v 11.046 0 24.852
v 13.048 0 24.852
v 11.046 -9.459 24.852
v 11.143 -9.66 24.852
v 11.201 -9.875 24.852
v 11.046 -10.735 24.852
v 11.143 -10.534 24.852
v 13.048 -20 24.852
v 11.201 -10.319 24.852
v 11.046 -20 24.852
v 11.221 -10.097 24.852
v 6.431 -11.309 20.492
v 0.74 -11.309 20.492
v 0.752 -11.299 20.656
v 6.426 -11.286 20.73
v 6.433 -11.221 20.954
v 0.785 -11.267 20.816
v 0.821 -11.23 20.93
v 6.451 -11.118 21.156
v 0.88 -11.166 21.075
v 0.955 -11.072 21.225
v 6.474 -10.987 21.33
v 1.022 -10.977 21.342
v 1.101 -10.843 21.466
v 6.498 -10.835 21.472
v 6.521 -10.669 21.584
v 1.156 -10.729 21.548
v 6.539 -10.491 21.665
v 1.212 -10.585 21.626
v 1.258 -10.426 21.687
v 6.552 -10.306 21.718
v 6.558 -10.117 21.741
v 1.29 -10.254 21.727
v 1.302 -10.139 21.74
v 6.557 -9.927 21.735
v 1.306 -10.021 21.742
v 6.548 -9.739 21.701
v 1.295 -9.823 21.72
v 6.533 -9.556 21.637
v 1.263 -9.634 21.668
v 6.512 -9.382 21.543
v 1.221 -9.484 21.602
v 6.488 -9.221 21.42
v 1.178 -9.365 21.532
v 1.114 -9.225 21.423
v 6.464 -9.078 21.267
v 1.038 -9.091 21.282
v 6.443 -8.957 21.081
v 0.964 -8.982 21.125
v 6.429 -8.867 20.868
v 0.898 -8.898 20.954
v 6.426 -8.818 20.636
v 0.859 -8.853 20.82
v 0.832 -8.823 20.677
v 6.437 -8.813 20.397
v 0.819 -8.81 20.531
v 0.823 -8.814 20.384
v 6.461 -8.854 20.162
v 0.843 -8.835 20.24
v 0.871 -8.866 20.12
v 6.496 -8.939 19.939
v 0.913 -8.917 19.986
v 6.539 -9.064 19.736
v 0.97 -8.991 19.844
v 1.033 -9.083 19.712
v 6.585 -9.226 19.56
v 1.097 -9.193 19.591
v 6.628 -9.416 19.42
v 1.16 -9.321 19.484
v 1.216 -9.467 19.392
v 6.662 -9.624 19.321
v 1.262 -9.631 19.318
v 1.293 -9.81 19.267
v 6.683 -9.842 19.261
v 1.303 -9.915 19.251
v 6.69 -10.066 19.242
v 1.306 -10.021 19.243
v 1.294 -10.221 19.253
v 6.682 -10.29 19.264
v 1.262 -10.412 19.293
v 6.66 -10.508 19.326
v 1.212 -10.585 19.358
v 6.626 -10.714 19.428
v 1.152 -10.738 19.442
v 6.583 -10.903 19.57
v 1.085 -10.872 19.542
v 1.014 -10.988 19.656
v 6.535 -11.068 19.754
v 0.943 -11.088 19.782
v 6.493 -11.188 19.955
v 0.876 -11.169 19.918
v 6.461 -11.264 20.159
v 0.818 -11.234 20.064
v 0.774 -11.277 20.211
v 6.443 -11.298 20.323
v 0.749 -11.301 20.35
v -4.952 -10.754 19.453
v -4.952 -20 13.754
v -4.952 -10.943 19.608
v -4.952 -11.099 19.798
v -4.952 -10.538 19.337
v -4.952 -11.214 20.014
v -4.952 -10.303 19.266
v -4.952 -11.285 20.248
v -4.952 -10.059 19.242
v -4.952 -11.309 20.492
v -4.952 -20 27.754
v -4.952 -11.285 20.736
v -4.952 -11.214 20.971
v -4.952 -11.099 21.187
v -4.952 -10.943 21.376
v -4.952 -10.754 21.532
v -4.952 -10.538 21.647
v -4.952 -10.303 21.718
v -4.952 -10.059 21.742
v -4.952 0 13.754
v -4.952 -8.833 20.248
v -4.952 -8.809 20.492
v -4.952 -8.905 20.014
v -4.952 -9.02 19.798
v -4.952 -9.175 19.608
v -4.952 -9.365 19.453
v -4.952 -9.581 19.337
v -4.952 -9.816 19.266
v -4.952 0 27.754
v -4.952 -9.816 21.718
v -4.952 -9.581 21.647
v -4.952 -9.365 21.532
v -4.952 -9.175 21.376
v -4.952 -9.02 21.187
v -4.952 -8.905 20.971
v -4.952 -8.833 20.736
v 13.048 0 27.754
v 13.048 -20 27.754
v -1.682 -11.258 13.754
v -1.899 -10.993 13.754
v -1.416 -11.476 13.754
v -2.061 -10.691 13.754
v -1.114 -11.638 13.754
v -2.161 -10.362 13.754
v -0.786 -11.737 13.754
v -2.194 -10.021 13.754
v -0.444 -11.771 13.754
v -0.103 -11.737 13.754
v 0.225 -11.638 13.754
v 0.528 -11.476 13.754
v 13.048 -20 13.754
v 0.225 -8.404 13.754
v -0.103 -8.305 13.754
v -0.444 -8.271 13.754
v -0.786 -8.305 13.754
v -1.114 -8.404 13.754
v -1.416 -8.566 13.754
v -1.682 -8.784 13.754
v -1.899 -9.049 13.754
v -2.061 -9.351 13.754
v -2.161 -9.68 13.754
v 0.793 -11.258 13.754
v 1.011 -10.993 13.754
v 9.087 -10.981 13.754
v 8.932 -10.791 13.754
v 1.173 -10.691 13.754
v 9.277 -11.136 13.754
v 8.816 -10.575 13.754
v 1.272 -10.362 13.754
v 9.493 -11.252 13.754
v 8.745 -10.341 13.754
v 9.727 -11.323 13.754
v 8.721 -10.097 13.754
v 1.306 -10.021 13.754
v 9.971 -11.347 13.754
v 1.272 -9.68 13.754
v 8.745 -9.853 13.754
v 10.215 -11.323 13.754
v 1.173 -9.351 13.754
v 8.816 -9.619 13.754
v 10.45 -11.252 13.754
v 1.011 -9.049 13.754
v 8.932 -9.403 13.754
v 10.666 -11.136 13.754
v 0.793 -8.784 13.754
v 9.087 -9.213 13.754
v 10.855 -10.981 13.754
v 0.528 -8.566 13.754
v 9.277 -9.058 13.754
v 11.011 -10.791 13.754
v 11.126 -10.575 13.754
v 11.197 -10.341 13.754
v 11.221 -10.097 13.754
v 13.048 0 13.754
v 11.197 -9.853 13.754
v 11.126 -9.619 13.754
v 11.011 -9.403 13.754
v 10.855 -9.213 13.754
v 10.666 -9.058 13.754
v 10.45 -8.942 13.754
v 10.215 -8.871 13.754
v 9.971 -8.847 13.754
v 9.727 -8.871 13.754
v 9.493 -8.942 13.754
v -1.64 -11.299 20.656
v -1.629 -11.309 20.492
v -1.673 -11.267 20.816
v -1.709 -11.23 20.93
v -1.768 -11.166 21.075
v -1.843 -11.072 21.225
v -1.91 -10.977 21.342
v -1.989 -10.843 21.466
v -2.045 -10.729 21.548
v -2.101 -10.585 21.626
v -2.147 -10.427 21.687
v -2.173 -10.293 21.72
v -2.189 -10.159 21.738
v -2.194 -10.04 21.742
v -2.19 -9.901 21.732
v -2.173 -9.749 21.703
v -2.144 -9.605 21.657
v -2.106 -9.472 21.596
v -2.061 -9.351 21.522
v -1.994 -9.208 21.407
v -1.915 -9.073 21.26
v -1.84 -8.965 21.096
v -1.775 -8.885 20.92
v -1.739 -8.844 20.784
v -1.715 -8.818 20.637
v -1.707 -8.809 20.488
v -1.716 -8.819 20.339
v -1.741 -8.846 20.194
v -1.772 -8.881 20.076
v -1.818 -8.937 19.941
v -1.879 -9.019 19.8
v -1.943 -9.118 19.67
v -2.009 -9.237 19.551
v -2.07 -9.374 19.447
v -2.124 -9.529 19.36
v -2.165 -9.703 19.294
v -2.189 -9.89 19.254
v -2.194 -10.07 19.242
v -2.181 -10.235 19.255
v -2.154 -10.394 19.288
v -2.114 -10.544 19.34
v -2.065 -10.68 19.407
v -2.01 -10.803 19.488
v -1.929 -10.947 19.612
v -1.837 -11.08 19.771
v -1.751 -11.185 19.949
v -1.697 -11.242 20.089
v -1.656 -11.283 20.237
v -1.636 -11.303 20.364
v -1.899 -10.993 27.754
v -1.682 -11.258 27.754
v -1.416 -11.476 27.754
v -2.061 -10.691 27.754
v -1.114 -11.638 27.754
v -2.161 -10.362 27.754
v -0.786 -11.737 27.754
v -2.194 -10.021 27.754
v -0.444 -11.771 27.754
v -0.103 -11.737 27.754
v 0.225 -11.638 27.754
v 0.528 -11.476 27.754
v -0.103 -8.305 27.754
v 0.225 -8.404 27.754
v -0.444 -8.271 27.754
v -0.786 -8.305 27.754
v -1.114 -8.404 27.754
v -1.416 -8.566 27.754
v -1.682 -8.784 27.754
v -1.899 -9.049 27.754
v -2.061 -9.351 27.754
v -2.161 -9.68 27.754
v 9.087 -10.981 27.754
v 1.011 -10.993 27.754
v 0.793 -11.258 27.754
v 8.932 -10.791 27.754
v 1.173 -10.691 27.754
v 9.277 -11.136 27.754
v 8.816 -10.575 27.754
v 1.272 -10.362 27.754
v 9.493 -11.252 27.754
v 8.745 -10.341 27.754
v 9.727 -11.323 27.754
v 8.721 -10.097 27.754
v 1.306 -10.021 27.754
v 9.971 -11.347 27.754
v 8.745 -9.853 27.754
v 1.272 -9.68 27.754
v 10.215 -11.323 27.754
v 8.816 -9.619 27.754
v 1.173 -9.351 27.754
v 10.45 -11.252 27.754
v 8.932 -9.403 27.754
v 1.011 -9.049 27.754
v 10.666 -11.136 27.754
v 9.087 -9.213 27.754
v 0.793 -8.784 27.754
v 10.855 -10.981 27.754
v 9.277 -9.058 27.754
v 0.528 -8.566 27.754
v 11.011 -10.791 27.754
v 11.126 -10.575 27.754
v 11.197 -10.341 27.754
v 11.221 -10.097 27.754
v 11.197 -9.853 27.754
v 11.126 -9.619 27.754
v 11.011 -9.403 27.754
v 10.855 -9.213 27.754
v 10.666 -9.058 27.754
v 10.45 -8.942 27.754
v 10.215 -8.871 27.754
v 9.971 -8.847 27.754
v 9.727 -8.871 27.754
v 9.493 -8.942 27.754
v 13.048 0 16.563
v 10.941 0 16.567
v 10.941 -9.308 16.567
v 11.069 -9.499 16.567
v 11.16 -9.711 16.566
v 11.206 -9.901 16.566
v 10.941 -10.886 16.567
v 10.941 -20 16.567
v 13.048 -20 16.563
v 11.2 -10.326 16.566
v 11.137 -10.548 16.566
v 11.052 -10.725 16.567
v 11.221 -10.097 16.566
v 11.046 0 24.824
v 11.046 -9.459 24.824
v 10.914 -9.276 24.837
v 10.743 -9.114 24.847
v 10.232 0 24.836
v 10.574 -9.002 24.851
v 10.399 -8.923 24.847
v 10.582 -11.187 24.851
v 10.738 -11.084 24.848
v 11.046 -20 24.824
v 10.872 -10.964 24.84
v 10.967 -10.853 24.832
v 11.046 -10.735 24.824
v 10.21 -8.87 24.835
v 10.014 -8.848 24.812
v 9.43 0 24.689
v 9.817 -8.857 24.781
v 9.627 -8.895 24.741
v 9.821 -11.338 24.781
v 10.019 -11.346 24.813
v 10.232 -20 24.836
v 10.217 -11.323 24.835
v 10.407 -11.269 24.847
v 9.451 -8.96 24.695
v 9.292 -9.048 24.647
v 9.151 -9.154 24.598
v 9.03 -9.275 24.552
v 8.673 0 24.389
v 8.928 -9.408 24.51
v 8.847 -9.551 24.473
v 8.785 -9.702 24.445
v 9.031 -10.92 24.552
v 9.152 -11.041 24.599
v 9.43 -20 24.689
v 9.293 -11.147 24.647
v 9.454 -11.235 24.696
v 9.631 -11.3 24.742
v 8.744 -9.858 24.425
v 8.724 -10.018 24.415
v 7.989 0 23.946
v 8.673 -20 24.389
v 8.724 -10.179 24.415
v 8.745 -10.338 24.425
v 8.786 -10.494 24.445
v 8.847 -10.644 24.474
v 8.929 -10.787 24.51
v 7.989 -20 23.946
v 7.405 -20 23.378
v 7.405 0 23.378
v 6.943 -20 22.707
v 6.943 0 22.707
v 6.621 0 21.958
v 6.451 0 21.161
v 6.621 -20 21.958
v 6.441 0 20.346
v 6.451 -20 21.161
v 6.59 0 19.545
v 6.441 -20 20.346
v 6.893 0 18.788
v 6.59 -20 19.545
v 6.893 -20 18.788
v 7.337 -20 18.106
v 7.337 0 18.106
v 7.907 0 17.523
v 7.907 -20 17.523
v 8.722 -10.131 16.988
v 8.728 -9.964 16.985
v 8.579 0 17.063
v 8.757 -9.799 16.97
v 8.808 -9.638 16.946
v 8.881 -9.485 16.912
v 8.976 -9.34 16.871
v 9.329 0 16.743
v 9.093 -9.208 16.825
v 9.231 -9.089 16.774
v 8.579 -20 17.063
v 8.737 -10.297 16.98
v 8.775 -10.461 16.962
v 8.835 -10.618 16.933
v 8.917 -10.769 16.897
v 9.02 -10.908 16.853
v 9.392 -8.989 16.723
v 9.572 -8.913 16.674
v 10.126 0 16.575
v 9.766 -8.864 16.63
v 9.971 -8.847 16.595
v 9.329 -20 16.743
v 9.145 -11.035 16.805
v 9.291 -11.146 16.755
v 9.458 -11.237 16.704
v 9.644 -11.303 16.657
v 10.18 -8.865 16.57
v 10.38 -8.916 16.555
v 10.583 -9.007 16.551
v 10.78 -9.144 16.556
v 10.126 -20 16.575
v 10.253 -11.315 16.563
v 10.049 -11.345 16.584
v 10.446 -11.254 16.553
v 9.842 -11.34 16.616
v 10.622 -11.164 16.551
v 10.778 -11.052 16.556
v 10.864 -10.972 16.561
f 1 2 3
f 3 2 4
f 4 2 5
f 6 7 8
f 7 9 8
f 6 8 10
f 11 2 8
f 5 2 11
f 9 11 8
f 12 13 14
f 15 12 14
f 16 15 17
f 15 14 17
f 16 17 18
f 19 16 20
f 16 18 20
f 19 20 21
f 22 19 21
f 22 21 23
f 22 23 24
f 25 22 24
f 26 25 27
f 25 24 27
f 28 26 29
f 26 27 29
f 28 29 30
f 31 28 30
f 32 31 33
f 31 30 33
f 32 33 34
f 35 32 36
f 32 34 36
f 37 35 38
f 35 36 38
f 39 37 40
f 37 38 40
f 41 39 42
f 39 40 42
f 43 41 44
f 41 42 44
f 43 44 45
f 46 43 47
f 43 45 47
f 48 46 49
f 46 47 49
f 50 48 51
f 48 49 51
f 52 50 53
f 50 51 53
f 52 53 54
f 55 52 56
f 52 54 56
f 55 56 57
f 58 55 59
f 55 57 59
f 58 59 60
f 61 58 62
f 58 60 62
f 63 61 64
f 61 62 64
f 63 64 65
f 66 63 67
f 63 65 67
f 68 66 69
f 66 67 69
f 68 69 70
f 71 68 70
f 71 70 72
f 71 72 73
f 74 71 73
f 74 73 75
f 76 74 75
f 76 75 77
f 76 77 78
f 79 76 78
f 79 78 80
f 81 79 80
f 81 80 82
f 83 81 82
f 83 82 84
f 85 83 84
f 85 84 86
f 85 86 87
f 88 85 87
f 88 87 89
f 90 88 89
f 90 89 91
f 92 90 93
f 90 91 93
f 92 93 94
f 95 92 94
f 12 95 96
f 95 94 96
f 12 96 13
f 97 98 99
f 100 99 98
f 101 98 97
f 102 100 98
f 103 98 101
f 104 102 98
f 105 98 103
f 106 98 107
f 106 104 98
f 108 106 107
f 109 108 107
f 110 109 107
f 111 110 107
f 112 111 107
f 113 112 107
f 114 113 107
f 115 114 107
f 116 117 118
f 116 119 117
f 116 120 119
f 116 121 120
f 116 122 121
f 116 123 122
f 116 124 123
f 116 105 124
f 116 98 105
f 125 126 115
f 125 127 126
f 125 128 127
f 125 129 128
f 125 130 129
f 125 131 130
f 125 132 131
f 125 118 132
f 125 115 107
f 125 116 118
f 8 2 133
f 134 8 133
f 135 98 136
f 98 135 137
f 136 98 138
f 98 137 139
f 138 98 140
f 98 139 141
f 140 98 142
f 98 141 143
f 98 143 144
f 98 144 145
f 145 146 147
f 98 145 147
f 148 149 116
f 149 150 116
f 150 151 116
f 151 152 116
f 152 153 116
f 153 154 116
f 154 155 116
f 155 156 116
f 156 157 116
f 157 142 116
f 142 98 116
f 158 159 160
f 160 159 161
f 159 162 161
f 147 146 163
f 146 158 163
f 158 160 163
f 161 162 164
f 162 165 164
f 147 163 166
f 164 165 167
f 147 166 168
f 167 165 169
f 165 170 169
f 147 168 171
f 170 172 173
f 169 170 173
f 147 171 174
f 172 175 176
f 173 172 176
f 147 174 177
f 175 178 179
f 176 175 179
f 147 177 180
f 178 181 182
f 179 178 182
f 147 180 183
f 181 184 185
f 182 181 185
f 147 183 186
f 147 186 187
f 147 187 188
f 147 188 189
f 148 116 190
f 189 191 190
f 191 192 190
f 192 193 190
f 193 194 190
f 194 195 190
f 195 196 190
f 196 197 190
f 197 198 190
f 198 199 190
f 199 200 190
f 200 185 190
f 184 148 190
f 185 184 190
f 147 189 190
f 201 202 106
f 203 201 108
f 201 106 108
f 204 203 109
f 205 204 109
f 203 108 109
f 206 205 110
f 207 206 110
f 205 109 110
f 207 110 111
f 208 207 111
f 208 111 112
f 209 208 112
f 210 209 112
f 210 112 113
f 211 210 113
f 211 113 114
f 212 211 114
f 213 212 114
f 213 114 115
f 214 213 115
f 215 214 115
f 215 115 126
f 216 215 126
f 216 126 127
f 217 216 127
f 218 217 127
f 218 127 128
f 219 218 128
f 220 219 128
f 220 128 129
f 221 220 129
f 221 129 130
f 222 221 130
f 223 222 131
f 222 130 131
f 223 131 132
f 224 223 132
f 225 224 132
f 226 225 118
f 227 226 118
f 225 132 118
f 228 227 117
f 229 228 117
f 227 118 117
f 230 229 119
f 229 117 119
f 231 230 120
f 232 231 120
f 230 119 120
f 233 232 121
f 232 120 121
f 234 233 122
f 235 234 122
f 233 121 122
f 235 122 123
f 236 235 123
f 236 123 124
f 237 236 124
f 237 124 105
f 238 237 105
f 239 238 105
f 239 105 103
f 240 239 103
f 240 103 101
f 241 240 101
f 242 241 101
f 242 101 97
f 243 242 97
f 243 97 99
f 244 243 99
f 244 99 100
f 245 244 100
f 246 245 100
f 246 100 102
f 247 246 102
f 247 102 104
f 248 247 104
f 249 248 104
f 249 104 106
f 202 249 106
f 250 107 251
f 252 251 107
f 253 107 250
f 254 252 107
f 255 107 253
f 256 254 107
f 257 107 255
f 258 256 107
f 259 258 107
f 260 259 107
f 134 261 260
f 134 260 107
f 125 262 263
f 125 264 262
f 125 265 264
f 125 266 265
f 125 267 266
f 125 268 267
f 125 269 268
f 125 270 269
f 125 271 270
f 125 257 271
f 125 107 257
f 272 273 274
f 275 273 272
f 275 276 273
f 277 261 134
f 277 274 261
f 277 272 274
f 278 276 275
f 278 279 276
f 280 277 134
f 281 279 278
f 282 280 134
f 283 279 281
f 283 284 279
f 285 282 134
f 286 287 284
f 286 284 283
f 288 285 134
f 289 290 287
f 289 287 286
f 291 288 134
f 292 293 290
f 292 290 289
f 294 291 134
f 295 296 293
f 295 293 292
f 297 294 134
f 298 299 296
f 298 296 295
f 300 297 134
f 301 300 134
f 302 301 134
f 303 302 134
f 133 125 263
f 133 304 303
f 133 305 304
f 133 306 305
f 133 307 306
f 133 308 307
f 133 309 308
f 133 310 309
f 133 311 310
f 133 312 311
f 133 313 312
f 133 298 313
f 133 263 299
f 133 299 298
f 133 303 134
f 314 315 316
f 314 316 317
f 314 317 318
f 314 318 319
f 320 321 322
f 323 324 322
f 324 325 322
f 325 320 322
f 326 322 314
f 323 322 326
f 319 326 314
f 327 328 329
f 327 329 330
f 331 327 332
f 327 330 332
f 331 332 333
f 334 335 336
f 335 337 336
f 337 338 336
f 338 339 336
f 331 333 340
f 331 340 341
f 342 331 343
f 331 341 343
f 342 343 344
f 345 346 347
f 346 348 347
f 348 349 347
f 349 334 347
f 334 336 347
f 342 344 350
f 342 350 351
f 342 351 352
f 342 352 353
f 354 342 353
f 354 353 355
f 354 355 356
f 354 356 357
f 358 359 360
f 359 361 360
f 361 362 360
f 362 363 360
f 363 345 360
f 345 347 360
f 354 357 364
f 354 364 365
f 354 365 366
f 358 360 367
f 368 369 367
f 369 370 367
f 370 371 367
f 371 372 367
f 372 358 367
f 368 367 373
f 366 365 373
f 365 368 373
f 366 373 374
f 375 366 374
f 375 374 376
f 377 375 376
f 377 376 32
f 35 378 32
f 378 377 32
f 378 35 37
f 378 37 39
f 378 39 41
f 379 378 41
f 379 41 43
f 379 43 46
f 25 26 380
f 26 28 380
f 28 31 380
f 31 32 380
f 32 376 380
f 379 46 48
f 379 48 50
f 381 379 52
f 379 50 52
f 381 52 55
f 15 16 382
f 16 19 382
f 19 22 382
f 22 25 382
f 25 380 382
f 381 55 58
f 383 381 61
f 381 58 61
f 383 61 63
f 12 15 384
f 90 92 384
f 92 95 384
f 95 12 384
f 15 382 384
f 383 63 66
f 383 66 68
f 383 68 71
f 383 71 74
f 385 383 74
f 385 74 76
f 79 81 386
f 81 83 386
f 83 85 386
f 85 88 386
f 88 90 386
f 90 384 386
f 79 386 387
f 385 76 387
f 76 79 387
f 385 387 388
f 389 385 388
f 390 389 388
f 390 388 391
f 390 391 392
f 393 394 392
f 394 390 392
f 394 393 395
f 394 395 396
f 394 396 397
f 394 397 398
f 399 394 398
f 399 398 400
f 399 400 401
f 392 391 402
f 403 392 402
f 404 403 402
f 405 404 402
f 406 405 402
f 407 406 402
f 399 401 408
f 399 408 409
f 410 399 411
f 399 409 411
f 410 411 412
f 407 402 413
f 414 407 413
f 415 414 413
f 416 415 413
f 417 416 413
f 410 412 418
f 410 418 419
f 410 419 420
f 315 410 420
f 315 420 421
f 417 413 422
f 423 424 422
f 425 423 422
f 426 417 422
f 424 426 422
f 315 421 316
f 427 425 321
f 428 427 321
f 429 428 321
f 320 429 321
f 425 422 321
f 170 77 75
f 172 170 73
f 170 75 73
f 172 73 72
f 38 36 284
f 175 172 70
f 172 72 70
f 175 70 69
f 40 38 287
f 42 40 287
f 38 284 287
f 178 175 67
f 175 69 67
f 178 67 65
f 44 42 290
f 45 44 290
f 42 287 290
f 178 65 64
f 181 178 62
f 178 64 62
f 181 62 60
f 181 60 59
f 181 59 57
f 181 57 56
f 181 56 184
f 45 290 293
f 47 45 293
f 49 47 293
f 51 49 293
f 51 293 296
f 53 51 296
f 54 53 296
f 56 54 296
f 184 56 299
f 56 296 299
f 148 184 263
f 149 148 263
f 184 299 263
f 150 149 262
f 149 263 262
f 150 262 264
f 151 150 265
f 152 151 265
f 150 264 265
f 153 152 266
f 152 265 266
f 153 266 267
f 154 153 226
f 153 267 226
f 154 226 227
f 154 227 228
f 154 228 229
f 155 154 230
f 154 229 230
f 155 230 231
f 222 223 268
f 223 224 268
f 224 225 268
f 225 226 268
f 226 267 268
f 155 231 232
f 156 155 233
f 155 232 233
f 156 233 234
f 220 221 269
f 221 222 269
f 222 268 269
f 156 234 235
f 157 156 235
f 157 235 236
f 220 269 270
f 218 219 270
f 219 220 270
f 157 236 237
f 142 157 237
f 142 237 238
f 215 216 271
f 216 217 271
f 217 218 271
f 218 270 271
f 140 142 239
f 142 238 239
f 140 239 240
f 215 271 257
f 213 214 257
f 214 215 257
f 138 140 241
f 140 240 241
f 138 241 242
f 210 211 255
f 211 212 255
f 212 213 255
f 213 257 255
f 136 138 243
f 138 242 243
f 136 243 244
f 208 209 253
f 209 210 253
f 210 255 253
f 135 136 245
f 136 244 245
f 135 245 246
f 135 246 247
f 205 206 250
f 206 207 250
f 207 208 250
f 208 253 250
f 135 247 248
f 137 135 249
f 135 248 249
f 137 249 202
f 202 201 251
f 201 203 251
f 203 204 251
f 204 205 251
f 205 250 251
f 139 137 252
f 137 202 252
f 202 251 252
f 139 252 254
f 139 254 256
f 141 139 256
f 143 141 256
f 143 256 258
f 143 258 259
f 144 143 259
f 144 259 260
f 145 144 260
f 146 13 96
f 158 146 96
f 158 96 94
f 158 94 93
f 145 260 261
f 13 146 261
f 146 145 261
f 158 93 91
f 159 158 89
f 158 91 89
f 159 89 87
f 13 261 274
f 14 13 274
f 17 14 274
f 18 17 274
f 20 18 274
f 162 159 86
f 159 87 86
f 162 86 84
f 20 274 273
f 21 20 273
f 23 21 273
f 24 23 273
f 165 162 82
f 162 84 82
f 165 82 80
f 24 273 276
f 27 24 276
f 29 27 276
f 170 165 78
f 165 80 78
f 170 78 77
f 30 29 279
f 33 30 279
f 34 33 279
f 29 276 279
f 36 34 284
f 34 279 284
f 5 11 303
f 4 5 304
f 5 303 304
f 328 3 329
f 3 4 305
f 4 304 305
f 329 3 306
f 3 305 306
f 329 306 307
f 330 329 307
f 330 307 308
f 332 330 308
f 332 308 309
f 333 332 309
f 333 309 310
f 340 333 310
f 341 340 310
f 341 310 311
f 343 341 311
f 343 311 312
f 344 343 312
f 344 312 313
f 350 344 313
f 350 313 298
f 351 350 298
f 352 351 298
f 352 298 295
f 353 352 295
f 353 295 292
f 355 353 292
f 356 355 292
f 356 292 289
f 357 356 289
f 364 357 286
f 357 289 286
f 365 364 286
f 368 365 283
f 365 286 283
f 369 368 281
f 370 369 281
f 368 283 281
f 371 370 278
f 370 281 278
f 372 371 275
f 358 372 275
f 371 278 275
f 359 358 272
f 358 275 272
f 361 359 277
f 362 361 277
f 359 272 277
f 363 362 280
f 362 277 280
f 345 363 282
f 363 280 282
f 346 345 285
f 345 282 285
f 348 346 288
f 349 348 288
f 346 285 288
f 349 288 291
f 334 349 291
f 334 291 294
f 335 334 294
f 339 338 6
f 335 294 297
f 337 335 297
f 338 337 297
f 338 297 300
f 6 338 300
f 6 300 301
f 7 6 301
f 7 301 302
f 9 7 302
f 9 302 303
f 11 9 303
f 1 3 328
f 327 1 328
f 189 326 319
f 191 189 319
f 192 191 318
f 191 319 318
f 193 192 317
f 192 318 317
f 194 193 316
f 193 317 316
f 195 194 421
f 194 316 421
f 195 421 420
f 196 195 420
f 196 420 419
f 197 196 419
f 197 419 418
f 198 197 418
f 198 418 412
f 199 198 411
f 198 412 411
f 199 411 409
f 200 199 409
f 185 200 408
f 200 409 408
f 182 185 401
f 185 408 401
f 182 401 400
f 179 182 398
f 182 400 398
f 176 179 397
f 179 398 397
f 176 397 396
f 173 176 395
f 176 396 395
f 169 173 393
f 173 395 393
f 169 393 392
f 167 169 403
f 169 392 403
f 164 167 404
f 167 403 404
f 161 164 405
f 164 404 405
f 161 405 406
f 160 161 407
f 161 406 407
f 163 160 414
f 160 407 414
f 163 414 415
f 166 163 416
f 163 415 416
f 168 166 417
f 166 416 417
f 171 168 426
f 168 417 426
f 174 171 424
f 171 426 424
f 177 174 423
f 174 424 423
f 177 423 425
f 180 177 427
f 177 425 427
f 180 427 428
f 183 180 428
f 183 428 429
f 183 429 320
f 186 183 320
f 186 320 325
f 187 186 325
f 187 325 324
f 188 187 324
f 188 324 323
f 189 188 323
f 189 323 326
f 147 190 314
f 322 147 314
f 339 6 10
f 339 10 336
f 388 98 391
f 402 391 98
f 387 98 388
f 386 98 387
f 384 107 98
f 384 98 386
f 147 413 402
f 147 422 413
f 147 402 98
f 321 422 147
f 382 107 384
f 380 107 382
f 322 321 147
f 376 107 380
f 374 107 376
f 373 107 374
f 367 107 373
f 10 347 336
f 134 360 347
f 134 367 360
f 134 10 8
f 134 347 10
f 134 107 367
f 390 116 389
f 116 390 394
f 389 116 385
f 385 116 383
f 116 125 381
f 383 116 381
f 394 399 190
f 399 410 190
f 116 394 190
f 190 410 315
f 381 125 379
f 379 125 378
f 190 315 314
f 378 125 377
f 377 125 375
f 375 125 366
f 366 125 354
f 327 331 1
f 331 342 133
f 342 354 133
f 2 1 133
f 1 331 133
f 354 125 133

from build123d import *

# Parameters (mm, degrees)
F0_W     = 18
F0_H     = 14
F1_DEPTH = 20
F3_DEPTH = 20
F4_R     = 1.25
F4_R_2   = 1.75
F5_DEPTH = 25
F6_R     = 1.25
F7_DEPTH = 25


with BuildPart() as f1:
    # F0 (on Front) → F1 (new body)
    with BuildSketch(Plane.XZ):
        with Locations((4.047778, 20.754311)):
            Rectangle(F0_W, F0_H)
    extrude(amount=F1_DEPTH)

    # F2 (on face) → F3 (cut)
    with BuildSketch(Plane.XZ.offset(20)):
        with BuildLine():
            Line((13.047778, 17.367337), (13.047778, 24.034069))
            ThreePointArc((13.047778, 24.034069), (12.099173, 24.560953), (11.046412, 24.823921))
            ThreePointArc((11.046412, 24.823921), (6.426039, 20.753776), (10.940806, 16.566795))
            ThreePointArc((10.940806, 16.566795), (12.049681, 16.821286), (13.047778, 17.367337))
        make_face()
        with BuildLine():
            Line((13.047778, 16.563023), (13.047778, 17.367337))
            ThreePointArc((13.047778, 17.367337), (12.049681, 16.821286), (10.940806, 16.566795))
            Line((10.940806, 16.566795), (13.047778, 16.563023))
        make_face()
        with BuildLine():
            ThreePointArc((11.046412, 24.823921), (12.099173, 24.560953), (13.047778, 24.034069))
            Line((13.047778, 24.034069), (13.047778, 24.851898))
            Line((13.047778, 24.851898), (11.046412, 24.851898))
            Line((11.046412, 24.851898), (11.046412, 24.823921))
        make_face()
    extrude(amount=-F3_DEPTH, mode=Mode.SUBTRACT)

    # F4 (on face) → F5 (cut)
    with BuildSketch(Plane.XY.offset(27.754311)):
        with Locations((9.971282, -10.096995)):
            Circle(F4_R)
        with Locations((-0.444201, -10.021016)):
            Circle(F4_R_2)
    extrude(amount=-F5_DEPTH, mode=Mode.SUBTRACT)

    # F6 (on face) → F7 (cut)
    with BuildSketch(Plane(origin=(-4.952222, 0, 0), x_dir=(0, -1, 0), z_dir=(-1, 0, 0))):
        with Locations((10.059365, 20.492349)):
            Circle(F6_R)
    extrude(amount=-F7_DEPTH, mode=Mode.SUBTRACT)


solid = f1.part
